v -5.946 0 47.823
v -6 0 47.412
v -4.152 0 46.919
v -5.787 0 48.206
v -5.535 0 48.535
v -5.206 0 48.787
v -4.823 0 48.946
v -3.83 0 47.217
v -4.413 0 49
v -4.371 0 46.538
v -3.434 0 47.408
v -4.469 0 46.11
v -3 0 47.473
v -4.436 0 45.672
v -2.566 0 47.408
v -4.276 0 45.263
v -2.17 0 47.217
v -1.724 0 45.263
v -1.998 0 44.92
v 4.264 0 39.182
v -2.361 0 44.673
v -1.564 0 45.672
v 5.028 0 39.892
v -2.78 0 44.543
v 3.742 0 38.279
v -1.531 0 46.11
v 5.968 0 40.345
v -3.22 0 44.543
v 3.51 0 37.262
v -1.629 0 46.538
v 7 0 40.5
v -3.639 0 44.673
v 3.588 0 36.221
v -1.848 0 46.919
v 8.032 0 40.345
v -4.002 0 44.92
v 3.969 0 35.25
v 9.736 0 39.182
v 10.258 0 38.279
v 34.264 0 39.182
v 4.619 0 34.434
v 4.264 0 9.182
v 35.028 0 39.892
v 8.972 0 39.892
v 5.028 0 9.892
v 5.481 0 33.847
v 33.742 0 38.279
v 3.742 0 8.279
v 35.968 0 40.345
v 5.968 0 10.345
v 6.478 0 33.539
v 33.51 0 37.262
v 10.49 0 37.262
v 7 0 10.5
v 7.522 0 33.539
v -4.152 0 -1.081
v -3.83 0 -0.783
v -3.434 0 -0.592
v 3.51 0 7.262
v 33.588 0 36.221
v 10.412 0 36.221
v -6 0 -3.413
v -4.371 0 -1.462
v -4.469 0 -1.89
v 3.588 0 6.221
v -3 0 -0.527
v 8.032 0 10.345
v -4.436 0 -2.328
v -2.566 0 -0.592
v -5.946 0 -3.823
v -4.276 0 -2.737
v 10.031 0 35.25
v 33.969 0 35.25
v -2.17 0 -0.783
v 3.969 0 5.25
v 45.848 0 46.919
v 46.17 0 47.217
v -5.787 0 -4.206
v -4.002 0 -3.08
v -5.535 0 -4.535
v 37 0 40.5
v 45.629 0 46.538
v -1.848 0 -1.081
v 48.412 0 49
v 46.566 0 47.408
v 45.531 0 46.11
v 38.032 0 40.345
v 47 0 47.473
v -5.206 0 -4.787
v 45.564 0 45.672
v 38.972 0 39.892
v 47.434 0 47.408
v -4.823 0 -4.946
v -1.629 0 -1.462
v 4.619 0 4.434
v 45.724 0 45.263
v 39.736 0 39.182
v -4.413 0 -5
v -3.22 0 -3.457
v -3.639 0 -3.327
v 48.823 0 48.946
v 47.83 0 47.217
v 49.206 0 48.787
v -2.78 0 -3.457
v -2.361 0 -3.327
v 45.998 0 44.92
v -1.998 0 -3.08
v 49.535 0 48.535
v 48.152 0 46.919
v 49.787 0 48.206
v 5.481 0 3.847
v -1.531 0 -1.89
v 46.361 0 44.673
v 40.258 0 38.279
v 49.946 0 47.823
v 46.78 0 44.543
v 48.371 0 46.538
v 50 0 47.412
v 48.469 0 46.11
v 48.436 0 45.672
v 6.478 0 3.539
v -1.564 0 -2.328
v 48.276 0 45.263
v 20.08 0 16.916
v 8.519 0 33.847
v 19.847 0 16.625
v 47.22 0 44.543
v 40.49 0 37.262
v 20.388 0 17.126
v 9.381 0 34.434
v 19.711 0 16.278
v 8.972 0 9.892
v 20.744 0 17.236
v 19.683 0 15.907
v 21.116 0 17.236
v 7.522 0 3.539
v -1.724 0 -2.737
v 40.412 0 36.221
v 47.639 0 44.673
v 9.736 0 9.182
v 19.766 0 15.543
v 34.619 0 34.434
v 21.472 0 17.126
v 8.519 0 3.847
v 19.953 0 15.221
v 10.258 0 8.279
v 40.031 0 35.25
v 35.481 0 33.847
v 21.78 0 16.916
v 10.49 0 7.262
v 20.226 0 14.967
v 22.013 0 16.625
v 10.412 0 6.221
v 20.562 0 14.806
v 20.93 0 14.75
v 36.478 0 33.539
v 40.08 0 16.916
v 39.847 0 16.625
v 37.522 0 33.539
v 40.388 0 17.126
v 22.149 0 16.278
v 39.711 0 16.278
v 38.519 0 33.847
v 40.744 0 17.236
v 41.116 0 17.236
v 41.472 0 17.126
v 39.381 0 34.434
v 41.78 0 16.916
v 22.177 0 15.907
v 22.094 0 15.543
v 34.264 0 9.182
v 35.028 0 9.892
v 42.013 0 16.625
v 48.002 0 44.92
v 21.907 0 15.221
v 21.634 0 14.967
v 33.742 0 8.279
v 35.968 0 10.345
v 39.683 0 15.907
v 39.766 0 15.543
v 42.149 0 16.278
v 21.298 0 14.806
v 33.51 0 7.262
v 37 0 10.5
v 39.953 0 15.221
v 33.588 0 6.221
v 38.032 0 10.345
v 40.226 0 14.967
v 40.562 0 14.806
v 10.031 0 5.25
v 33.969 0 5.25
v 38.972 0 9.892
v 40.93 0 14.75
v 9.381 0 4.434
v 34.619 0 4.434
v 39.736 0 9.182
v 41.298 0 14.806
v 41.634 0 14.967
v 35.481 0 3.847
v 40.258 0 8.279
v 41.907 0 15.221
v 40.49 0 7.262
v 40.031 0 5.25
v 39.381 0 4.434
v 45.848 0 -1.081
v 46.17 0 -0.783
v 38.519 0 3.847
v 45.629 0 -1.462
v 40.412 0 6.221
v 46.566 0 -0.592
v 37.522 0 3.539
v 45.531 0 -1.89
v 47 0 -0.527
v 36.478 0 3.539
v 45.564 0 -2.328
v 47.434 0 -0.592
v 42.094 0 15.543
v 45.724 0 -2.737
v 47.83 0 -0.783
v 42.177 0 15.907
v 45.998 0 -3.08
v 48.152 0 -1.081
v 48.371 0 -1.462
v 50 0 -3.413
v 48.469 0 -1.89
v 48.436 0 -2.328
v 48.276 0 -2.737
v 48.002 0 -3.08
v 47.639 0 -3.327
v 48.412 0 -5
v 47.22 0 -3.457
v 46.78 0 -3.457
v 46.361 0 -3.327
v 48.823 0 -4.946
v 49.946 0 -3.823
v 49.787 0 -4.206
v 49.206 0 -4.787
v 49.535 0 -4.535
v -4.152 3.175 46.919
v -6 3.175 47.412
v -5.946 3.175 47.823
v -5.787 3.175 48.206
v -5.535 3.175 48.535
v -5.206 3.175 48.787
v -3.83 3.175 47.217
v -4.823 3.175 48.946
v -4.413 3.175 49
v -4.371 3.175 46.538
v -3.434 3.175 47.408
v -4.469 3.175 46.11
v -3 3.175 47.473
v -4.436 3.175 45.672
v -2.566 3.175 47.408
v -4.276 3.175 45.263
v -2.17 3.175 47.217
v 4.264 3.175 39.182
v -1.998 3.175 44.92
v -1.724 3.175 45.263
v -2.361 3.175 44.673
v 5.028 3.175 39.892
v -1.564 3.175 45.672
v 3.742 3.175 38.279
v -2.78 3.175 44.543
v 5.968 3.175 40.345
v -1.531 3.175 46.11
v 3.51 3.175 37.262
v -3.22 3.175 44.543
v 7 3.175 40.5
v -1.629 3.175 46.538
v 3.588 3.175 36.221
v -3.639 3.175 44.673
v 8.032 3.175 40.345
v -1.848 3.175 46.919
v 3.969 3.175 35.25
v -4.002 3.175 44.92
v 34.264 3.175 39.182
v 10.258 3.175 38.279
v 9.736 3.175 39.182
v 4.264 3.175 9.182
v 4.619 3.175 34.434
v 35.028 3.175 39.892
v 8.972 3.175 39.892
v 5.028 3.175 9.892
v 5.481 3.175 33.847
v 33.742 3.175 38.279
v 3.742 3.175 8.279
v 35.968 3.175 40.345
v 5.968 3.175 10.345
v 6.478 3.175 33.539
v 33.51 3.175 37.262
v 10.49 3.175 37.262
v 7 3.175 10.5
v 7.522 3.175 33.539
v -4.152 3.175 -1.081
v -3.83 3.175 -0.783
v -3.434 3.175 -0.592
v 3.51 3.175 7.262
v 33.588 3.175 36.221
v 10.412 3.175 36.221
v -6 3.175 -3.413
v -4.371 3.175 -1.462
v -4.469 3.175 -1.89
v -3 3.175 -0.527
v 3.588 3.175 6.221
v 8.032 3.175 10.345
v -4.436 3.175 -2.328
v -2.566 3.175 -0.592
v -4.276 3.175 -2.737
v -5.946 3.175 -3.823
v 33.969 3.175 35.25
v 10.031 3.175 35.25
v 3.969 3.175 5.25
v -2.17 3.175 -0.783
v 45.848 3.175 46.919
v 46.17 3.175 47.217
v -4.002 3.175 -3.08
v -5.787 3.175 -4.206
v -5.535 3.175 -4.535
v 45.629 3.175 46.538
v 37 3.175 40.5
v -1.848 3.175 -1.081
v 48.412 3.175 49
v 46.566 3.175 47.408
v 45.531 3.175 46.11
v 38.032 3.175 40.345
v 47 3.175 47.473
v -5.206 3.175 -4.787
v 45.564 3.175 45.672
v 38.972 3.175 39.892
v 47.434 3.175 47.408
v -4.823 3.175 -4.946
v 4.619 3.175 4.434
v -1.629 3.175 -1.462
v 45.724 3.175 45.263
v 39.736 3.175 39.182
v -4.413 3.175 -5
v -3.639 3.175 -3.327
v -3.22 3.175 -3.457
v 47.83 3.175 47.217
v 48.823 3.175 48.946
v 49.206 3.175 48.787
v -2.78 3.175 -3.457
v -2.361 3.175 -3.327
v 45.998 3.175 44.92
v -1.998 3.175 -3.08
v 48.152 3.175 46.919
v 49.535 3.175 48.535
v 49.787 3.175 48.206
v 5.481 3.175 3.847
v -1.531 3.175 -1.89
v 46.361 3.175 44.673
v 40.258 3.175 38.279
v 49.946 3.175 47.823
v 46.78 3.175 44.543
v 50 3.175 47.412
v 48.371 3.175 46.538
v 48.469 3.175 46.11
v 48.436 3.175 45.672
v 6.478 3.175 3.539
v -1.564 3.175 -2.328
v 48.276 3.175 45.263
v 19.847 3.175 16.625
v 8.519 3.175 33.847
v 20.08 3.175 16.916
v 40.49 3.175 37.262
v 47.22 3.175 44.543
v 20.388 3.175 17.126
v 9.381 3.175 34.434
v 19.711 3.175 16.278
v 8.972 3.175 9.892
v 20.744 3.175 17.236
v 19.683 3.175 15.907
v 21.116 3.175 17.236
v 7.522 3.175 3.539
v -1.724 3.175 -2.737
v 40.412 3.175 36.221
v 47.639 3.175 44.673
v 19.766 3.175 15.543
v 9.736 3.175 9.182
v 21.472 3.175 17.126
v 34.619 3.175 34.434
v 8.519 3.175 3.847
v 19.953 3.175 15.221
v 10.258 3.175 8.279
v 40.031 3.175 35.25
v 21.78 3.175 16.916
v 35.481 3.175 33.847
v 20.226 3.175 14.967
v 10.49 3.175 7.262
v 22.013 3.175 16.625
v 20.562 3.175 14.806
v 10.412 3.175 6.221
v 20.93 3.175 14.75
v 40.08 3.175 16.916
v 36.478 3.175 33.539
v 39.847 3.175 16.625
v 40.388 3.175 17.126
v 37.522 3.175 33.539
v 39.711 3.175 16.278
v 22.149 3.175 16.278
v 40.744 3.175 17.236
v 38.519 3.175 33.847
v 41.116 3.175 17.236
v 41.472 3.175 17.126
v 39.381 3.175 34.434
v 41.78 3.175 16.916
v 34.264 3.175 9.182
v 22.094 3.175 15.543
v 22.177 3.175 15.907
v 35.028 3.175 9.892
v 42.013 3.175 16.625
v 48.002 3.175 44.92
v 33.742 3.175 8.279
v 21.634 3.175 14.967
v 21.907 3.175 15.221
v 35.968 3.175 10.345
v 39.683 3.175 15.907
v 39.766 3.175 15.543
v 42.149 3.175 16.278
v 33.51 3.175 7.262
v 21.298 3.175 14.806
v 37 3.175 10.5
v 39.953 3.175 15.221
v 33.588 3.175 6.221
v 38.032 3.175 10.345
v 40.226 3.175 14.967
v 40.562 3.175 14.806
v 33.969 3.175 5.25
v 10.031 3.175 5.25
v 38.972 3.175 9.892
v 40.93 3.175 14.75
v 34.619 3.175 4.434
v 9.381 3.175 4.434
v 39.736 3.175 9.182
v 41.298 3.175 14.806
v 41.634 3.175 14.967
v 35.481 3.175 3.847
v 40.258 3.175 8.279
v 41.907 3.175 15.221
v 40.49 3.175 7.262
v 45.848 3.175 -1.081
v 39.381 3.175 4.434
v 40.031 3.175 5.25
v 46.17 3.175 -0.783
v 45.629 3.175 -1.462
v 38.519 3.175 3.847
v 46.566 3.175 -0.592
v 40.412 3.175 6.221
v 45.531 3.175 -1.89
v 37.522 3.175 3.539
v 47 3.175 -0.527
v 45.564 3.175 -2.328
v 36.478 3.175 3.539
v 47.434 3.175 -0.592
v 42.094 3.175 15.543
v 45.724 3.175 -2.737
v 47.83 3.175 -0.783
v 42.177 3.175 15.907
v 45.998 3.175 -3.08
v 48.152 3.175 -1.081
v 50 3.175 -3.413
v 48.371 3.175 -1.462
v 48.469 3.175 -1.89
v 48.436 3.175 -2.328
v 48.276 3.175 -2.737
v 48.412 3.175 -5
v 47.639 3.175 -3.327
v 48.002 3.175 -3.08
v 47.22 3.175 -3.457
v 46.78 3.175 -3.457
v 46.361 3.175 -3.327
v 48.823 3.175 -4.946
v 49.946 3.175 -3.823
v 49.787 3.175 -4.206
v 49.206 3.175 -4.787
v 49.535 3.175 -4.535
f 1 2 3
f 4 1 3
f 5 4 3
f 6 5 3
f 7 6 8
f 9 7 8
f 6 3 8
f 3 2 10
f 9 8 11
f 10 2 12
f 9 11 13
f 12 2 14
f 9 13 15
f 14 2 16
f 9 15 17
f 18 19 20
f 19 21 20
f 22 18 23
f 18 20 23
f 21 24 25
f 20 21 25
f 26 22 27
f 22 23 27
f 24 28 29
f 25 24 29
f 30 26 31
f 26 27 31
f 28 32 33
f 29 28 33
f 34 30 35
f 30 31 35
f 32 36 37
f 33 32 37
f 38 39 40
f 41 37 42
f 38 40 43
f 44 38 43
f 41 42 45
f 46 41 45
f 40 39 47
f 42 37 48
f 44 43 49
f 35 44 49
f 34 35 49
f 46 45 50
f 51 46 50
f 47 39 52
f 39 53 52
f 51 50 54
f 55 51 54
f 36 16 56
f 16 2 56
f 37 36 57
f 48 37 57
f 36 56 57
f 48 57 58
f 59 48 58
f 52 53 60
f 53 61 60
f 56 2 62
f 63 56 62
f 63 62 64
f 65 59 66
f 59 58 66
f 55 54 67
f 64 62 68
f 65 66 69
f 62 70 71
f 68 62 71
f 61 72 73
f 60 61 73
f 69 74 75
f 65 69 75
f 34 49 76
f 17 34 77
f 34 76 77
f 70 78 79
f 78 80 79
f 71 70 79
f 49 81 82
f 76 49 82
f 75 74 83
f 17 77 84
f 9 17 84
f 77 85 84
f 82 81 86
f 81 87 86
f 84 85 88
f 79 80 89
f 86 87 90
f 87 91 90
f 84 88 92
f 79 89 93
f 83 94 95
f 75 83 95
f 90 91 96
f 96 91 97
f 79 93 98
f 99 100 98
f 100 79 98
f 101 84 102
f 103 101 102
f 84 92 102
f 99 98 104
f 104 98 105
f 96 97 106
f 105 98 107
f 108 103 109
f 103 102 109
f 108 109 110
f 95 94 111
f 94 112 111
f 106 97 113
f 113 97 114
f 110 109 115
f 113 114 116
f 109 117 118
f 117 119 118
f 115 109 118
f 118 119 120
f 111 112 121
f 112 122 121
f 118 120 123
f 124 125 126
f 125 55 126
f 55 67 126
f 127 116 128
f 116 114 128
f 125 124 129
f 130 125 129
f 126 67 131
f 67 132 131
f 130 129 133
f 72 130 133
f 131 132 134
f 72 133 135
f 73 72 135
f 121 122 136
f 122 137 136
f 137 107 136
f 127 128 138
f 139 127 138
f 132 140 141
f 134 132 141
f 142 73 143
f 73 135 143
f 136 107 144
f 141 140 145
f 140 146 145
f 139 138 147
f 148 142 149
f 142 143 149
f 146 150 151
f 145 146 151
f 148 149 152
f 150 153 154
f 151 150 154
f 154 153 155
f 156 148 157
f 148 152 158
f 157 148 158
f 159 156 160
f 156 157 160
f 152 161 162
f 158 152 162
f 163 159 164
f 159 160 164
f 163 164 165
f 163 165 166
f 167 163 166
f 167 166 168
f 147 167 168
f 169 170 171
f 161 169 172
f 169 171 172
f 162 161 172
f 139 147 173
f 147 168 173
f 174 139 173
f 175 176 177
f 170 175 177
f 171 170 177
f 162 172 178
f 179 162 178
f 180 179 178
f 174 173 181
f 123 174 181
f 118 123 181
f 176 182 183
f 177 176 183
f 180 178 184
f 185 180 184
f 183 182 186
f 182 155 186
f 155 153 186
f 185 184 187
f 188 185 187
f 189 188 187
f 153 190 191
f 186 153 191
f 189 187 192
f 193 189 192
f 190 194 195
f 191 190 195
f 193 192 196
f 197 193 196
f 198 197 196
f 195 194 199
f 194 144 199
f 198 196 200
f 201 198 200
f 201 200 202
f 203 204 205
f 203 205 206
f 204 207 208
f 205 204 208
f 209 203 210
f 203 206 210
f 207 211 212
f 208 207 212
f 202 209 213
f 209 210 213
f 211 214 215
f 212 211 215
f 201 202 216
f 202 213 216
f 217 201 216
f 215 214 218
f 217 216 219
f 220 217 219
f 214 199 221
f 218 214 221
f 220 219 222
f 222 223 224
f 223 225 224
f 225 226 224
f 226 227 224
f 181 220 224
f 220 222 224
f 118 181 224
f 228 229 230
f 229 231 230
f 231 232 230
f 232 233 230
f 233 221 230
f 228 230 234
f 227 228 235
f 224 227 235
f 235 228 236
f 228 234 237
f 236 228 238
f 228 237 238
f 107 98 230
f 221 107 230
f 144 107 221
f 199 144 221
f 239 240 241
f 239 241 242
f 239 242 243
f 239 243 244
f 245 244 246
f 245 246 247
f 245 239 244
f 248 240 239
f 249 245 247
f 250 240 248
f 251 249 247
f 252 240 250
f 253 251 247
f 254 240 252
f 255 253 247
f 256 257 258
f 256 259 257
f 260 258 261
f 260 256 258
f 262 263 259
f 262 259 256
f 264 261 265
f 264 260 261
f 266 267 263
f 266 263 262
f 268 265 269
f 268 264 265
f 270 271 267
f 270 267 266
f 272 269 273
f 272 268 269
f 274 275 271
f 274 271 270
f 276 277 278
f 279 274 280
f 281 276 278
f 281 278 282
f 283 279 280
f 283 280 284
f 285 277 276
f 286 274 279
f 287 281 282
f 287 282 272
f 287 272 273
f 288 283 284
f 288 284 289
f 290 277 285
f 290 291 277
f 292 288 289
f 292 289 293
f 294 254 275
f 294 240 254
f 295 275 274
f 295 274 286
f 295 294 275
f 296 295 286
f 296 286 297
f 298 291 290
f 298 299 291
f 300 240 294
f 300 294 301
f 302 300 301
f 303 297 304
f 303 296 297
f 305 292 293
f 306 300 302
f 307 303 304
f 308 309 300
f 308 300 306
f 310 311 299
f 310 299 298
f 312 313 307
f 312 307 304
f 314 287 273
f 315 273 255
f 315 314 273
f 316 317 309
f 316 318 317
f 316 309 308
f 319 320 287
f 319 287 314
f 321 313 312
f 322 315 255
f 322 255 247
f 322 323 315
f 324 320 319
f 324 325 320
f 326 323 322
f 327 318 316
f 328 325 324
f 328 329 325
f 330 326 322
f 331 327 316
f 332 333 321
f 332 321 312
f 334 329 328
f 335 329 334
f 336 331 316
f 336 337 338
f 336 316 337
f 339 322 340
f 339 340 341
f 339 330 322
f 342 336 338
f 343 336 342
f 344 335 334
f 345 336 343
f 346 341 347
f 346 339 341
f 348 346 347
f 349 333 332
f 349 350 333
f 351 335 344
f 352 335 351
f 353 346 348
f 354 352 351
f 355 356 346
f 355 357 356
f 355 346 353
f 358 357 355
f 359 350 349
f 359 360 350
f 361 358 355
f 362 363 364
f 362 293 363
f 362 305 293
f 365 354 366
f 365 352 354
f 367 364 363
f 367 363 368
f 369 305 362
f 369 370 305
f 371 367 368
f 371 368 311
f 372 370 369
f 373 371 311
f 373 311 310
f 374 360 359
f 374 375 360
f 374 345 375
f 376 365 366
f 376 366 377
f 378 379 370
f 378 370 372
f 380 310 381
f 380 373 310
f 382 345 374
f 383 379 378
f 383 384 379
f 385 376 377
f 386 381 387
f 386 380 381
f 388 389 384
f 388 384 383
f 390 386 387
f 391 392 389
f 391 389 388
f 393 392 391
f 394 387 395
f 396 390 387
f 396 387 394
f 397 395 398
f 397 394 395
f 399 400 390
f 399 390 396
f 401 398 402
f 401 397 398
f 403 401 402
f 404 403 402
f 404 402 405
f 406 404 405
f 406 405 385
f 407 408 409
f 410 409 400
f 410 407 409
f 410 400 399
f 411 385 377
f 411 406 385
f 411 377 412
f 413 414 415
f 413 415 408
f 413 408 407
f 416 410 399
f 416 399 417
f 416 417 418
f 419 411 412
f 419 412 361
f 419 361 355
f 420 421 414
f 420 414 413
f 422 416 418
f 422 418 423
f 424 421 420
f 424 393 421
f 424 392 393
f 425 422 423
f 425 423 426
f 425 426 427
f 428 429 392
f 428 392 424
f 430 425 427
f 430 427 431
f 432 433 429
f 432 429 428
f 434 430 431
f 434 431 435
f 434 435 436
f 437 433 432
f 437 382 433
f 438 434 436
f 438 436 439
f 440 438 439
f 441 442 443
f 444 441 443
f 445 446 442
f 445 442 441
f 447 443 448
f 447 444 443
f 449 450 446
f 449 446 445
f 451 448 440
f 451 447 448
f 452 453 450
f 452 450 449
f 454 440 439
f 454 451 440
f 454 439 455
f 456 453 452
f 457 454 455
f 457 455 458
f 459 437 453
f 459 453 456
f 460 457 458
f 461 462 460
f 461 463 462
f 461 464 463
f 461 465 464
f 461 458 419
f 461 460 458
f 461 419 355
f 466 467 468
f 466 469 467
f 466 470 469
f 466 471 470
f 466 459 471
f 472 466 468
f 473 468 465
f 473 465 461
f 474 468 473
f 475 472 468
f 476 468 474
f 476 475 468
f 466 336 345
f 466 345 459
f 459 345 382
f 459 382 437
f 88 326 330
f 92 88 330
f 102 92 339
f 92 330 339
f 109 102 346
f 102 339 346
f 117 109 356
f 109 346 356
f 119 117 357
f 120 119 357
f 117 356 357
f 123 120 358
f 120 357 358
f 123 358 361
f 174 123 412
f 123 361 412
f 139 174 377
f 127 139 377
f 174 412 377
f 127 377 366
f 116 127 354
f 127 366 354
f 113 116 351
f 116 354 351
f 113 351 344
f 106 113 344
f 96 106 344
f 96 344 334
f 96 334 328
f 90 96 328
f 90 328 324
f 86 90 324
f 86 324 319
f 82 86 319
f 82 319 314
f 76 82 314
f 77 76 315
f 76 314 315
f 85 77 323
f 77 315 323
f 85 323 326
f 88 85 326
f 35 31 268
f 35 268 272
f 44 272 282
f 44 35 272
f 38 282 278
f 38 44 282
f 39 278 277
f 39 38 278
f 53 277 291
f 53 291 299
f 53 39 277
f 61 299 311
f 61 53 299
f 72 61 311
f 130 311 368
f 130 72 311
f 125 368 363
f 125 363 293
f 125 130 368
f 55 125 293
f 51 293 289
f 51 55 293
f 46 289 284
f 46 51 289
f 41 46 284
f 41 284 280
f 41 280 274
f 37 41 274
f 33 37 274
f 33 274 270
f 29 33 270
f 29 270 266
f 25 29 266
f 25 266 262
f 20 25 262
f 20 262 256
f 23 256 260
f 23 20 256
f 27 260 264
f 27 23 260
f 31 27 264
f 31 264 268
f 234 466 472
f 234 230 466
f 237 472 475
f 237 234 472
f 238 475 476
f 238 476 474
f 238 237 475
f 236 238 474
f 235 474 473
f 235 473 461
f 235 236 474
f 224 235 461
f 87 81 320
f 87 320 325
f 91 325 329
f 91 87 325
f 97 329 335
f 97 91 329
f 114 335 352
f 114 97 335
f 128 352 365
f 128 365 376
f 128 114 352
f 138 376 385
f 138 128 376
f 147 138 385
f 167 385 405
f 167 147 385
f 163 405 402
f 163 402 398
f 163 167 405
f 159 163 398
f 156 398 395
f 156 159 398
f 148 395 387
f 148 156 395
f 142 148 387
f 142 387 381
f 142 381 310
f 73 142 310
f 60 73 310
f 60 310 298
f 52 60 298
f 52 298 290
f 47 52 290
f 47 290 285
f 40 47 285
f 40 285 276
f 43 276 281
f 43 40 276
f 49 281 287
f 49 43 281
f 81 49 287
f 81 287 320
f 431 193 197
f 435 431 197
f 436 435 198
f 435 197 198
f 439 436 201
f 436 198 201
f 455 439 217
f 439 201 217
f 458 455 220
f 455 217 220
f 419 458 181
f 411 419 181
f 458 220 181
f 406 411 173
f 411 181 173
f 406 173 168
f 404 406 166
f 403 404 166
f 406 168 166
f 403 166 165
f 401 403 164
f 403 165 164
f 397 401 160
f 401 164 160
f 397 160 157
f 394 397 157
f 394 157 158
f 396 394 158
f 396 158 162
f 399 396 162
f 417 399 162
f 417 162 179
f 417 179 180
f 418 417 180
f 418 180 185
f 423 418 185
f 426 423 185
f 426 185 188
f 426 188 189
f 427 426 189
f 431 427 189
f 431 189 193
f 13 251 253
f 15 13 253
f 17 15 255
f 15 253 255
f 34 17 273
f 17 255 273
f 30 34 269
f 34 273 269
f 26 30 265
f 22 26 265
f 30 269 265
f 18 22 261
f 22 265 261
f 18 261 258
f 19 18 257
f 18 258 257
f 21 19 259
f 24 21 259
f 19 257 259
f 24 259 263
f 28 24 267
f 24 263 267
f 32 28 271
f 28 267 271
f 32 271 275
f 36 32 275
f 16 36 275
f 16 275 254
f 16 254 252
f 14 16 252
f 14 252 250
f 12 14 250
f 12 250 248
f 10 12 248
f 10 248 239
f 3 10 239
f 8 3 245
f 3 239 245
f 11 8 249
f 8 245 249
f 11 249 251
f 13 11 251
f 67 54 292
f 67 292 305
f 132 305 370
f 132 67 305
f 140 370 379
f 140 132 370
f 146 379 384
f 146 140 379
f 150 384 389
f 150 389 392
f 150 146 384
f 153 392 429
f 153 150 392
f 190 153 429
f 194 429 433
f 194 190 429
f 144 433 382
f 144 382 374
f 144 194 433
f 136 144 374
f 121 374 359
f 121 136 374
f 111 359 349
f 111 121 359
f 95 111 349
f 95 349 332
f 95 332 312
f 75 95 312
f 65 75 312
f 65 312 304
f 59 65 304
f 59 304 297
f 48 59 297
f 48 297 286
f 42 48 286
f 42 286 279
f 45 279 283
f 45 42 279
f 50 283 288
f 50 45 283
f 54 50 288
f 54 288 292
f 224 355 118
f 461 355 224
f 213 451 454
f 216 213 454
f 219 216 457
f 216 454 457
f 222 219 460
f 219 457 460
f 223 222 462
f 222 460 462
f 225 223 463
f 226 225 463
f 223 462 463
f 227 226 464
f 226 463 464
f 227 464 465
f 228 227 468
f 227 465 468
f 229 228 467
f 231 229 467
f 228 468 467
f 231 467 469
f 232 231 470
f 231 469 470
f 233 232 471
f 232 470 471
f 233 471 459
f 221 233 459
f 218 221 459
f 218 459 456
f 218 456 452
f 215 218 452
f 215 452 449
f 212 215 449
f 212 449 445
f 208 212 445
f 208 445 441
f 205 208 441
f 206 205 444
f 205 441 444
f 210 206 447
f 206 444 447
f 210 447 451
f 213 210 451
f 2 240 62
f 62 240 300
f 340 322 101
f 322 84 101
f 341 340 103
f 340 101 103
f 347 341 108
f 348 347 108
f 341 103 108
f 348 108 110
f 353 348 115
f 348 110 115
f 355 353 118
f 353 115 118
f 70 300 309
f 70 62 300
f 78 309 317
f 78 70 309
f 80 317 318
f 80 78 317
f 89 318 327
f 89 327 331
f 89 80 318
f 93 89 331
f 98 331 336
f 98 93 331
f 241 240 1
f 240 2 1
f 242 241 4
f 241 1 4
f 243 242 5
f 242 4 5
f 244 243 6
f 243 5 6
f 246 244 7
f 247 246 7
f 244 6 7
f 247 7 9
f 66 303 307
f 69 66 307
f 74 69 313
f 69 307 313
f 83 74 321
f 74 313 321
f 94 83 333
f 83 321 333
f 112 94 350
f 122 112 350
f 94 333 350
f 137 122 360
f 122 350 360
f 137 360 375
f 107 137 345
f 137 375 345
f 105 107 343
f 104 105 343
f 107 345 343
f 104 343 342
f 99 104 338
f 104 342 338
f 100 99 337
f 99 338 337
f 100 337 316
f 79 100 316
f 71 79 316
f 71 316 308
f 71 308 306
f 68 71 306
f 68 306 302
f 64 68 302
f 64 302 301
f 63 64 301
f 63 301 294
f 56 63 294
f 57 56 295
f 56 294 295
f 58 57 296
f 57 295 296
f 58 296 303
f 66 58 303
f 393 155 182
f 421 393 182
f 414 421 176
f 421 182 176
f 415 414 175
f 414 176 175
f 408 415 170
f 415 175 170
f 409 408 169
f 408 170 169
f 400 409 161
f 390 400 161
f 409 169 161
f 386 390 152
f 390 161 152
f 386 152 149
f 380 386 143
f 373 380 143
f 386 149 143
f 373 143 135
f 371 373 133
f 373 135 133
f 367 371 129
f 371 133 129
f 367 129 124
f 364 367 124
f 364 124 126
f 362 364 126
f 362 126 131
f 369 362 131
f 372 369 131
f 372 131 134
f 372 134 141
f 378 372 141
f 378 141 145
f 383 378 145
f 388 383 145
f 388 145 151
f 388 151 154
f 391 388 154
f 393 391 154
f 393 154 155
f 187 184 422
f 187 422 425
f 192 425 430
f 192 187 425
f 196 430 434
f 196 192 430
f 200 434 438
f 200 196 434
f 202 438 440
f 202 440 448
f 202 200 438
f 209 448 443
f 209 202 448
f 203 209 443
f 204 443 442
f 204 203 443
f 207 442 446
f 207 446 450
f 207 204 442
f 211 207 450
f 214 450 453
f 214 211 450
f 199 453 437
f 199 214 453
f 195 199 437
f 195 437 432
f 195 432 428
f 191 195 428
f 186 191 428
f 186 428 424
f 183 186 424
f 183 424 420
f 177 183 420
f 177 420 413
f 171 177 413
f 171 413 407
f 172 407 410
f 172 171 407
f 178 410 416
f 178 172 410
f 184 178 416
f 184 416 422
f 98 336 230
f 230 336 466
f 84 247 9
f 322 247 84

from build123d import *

# Parameters (mm, degrees)
SKETCH1_W             = 44
SKETCH1_H             = 44
SKETCH1_R             = 0.5
SKETCH1_R_2           = 3.5
SKETCH1_H_2           = 5
BOSS_EXTRUDE1_DEPTH   = 3.175
SKETCH3_W             = 6
SKETCH3_H             = 54
SKETCH3_R             = 1.4732
BOSS_EXTRUDE2_DEPTH   = 3.175
M3X0_5_TAPPED_HOLE1_D = 2.5
FILLET1_R             = 1.5875


with BuildPart() as part:
    # Sketch1 → Boss-Extrude1 (new body)
    # profile 1 of 3: a face of its own
    with BuildSketch(Plane(origin=(0, 0, 0), x_dir=(1, 0, 0), z_dir=(0, 1, 0))):
        with Locations((22, -22)):
            Rectangle(SKETCH1_W, SKETCH1_H)
        with Locations(Location((40.93, -16, 0), (0, 0, 270))):
            Circle(SKETCH1_R, mode=Mode.SUBTRACT)
        with Locations(Location((20.93, -16, 0), (0, 0, 270))):
            Circle(SKETCH1_R, mode=Mode.SUBTRACT)
        with Locations(Location((7, -37, 0), (0, 0, 270))):
            Circle(SKETCH1_R_2, mode=Mode.SUBTRACT)
        with Locations(Location((37, -37, 0), (0, 0, 270))):
            Circle(SKETCH1_R_2, mode=Mode.SUBTRACT)
        with Locations(Location((37, -7, 0), (0, 0, 270))):
            Circle(SKETCH1_R_2, mode=Mode.SUBTRACT)
        with Locations(Location((7, -7, 0), (0, 0, 270))):
            Circle(SKETCH1_R_2, mode=Mode.SUBTRACT)
    # profile 2 of 3: a face of its own
    with BuildSketch(Plane(origin=(0, 0, 0), x_dir=(1, 0, 0), z_dir=(0, 1, 0))):
        with Locations((22, 2.5)):
            Rectangle(SKETCH1_W, SKETCH1_H_2)
    # profile 3 of 3: a face of its own
    with BuildSketch(Plane(origin=(0, 0, 0), x_dir=(1, 0, 0), z_dir=(0, 1, 0))):
        with Locations((22, -46.5)):
            Rectangle(SKETCH1_W, SKETCH1_H_2)
    extrude(amount=BOSS_EXTRUDE1_DEPTH)

    # Sketch3 → Boss-Extrude2 (add)
    # profile 1 of 2: a face of its own
    with BuildSketch(Plane(origin=(0, 3.175, 0), x_dir=(1, 0, 0), z_dir=(0, 1, 0))):
        with Locations((-3, -22)):
            Rectangle(SKETCH3_W, SKETCH3_H)
        with Locations(Location((-3, 2, 0), (0, 0, 270))):
            Circle(SKETCH3_R, mode=Mode.SUBTRACT)
        with Locations(Location((-3, -46, 0), (0, 0, 270))):
            Circle(SKETCH3_R, mode=Mode.SUBTRACT)
    # profile 2 of 2: a face of its own
    with BuildSketch(Plane(origin=(0, 3.175, 0), x_dir=(1, 0, 0), z_dir=(0, 1, 0))):
        with Locations((47, -22)):
            Rectangle(SKETCH3_W, SKETCH3_H)
        with Locations(Location((47, -46, 0), (0, 0, 270))):
            Circle(SKETCH3_R, mode=Mode.SUBTRACT)
        with Locations(Location((47, 2, 0), (0, 0, 270))):
            Circle(SKETCH3_R, mode=Mode.SUBTRACT)
    extrude(amount=-BOSS_EXTRUDE2_DEPTH)

    # M3x0.5 Tapped Hole1 (through all)
    with Locations(Plane(origin=(40.93, 3.175, 16), x_dir=(0, 0, 1), z_dir=(0, 1, 0))):
        with Locations((0, 0), (0, -20)):
            Hole(M3X0_5_TAPPED_HOLE1_D / 2)

    # Fillet1
    fillet1_edges = [part.edges().sort_by_distance(p)[0] for p in [
        (-6, 1.5875, -5),
        (-6, 1.5875, 49),
        (50, 1.5875, 49),
        (50, 1.5875, -5),
    ]]
    fillet(fillet1_edges, radius=FILLET1_R)


solid = part.part
